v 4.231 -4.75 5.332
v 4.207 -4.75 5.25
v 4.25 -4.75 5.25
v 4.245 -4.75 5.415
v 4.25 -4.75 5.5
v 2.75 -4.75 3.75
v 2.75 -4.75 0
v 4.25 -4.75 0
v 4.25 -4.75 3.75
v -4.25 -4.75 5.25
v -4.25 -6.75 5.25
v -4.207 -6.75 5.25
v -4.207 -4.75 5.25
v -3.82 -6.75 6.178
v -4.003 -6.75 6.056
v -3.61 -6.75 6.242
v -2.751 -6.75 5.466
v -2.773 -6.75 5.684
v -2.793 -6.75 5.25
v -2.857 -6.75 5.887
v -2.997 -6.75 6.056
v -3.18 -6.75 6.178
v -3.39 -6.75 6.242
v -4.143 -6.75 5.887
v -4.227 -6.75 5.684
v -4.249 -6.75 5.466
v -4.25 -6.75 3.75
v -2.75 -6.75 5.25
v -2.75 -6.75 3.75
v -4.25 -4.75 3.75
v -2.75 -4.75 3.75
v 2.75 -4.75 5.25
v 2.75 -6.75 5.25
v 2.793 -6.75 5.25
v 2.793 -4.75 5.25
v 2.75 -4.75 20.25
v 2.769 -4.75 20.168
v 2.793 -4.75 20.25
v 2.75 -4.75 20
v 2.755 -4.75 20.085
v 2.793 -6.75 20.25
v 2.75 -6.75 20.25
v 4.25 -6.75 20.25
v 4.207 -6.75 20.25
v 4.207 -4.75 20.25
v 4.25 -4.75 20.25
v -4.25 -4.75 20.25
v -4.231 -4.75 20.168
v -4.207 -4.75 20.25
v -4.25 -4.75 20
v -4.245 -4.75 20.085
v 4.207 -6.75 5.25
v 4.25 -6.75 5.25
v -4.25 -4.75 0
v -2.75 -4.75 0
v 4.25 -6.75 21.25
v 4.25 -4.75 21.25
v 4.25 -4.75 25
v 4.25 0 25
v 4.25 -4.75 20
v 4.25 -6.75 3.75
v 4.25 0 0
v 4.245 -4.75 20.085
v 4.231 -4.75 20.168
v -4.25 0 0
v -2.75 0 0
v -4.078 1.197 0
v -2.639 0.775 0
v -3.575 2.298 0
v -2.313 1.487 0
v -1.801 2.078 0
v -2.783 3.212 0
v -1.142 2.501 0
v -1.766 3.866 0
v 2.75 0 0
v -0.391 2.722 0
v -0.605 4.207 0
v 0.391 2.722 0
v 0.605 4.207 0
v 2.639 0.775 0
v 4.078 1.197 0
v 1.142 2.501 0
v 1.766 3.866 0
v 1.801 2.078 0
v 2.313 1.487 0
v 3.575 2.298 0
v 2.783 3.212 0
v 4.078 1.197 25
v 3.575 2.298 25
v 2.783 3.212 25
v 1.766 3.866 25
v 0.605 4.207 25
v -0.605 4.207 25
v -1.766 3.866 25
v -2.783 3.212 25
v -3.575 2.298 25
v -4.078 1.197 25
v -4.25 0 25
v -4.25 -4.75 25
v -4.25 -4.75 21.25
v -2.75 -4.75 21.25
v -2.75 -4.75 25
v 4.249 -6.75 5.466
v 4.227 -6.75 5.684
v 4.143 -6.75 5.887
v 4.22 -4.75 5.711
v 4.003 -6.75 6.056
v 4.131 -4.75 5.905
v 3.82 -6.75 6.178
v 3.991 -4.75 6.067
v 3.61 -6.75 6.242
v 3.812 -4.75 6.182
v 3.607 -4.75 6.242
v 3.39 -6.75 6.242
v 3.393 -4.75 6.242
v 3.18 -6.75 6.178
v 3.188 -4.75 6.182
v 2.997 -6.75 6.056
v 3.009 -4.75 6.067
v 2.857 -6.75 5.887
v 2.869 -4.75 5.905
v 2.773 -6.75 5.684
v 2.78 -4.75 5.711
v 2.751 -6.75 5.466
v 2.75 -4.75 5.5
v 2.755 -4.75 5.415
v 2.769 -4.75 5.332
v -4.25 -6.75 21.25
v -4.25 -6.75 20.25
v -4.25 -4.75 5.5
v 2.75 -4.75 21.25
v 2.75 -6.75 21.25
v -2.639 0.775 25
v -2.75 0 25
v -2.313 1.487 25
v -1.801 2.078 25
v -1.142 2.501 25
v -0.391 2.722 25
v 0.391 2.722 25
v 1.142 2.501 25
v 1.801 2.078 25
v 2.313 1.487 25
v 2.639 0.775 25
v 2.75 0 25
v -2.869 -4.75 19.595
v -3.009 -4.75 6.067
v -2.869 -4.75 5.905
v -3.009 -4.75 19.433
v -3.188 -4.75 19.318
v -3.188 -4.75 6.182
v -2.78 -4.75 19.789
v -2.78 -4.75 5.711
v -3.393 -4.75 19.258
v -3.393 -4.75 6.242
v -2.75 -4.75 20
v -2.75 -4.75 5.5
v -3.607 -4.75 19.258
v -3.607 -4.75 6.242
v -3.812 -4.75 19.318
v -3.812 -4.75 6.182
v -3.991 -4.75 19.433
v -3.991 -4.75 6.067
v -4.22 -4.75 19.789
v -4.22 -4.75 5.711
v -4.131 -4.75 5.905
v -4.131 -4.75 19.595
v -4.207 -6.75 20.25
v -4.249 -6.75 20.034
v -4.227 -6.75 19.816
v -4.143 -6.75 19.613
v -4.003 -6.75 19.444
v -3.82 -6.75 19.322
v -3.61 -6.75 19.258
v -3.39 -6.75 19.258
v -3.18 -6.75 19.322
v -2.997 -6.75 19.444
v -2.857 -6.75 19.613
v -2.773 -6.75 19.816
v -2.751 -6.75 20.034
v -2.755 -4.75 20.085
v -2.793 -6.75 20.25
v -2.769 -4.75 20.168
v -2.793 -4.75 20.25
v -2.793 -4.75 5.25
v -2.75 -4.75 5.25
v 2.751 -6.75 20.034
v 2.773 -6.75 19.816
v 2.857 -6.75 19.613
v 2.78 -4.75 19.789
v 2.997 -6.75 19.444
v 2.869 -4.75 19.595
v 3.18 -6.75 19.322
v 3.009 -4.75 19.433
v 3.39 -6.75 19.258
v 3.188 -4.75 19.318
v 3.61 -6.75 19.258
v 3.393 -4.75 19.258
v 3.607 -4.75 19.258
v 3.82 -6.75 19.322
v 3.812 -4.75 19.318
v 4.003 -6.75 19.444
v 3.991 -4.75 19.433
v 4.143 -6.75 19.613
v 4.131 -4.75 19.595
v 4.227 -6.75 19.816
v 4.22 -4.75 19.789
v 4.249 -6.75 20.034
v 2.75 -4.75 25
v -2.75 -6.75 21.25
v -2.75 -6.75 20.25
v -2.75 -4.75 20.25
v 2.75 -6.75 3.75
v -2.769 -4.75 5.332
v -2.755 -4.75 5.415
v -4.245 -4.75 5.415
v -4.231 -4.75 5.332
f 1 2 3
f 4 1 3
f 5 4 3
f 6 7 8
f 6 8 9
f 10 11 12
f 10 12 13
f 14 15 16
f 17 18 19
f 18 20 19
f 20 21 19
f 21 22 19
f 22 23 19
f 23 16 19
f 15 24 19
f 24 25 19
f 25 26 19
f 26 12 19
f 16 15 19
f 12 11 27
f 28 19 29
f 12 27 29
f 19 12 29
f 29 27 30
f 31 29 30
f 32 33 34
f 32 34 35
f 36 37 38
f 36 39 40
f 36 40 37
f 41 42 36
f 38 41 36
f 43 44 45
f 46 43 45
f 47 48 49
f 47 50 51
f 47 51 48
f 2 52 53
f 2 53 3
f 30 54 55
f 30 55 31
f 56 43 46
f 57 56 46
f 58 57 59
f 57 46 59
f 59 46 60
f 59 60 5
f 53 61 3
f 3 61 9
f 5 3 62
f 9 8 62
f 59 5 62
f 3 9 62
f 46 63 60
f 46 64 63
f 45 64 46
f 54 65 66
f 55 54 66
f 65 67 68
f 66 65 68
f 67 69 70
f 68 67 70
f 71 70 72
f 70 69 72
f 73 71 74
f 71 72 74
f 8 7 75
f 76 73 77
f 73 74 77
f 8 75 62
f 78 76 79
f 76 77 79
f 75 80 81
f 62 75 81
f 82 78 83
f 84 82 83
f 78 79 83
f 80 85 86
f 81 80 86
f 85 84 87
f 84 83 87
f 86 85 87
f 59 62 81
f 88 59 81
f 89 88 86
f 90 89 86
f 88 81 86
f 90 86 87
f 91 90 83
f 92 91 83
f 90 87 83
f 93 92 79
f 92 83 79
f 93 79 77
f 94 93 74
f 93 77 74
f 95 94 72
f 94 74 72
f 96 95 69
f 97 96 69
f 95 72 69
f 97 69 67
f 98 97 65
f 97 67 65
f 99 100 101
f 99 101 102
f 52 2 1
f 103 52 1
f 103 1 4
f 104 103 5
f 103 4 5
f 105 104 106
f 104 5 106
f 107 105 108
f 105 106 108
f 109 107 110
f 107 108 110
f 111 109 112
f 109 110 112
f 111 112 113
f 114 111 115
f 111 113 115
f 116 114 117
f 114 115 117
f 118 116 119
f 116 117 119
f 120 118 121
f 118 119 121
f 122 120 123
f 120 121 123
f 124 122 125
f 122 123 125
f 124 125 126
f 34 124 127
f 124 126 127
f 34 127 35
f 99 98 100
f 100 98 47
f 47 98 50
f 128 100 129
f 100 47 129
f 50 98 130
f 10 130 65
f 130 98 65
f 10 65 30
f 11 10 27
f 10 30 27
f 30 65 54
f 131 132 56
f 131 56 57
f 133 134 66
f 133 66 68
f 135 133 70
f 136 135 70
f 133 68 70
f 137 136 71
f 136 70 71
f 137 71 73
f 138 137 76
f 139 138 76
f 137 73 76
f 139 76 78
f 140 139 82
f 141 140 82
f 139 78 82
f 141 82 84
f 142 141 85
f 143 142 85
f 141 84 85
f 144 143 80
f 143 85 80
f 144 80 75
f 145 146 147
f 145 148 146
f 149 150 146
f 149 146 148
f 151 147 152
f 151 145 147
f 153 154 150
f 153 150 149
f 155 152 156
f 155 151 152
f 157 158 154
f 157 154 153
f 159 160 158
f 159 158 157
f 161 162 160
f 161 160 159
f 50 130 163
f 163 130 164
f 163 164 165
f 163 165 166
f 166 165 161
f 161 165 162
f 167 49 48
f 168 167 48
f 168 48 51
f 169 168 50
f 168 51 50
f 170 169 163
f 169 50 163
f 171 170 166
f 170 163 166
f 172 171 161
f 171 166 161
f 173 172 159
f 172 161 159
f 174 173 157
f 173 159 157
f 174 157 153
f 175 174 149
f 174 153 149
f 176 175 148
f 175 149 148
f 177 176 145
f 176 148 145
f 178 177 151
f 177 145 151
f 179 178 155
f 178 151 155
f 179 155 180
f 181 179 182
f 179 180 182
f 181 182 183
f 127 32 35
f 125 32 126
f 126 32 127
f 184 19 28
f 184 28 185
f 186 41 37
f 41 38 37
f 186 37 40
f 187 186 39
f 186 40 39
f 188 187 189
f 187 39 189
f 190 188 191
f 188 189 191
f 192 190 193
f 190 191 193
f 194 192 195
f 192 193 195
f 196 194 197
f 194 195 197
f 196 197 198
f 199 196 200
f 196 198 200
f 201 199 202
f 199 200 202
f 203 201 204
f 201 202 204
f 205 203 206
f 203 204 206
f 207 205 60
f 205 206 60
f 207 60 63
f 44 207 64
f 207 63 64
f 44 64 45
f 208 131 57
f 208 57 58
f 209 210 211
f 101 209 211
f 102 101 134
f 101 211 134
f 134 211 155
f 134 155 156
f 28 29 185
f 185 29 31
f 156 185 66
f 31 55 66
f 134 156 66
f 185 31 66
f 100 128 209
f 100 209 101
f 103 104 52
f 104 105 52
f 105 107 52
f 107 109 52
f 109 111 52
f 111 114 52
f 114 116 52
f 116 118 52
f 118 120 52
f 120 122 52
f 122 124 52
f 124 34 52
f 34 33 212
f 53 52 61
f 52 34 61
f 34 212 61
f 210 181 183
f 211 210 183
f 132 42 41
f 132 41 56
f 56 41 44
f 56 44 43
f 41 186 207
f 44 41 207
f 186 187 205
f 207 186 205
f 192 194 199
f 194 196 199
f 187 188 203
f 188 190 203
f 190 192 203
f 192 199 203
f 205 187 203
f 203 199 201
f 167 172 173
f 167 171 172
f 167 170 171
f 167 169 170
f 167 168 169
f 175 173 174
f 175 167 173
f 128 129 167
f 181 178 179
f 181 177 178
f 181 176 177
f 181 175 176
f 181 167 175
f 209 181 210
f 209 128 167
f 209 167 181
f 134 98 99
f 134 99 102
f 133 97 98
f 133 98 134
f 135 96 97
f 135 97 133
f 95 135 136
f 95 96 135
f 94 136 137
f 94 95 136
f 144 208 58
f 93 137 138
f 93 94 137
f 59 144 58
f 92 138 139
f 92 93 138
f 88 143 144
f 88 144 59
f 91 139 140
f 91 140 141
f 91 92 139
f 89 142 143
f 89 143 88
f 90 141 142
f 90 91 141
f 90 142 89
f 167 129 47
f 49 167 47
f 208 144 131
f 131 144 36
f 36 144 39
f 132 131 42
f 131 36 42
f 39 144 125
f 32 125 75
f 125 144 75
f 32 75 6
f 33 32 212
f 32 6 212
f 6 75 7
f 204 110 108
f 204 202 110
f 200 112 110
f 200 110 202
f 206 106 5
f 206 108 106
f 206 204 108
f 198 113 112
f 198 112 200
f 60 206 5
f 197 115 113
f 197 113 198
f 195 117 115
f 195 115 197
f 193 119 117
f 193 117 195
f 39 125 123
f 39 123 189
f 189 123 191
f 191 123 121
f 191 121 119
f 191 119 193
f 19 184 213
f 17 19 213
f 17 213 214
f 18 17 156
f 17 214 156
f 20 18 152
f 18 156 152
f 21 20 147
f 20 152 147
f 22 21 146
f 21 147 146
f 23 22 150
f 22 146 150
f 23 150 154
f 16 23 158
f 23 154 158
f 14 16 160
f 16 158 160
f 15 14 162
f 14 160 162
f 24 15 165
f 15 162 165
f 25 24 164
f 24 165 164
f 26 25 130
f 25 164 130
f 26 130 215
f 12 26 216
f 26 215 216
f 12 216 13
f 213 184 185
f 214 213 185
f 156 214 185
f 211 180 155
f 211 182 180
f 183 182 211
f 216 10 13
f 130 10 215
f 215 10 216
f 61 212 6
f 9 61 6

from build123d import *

# Parameters (mm, degrees)
SM_BASE_FLANGE_1_DEPTH = 25
SKETCH_6_W             = 3.75
SKETCH_6_H             = 2
SKETCH_6_W_2           = 15
CUT_EXTRUDE_1_DEPTH    = 10
SKETCH_7_R             = 0.75
EXTRUDE_1_DEPTH        = 2


# Sheet-metal steps are written as plain solids
with BuildPart() as part:
    # Sketch 2 → 基体-法兰1 (new body)
    with BuildSketch(Plane.XY):
        with BuildLine():
            Line((4.25, -6.75), (4.25, 0))
            ThreePointArc((4.25, 0), (0, 4.25), (-4.25, 0))
            Line((-4.25, 0), (-4.25, -6.75))
            Line((-4.25, -6.75), (-2.75, -6.75))
            Line((-2.75, -6.75), (-2.75, 0))
            ThreePointArc((-2.75, 0), (0, 2.75), (2.75, 0))
            Line((2.75, 0), (2.75, -6.75))
            Line((2.75, -6.75), (4.25, -6.75))
        make_face()
    extrude(amount=SM_BASE_FLANGE_1_DEPTH)

    # 草图6 → 切除-拉伸1 (cut)
    with BuildSketch(Plane.ZY.offset(4.25)):
        with Locations((1.875, -5.75)):
            Rectangle(SKETCH_6_W, SKETCH_6_H)
        with Locations((12.75, -5.75)):
            Rectangle(SKETCH_6_W_2, SKETCH_6_H)
        with Locations((23.125, -5.75)):
            Rectangle(SKETCH_6_W, SKETCH_6_H)
    extrude(amount=-CUT_EXTRUDE_1_DEPTH, mode=Mode.SUBTRACT)

    # 草图7 → 凸台-拉伸1 (add)
    with BuildSketch(Plane.XZ.offset(4.75)):
        with Locations((-3.5, 20)):
            Circle(SKETCH_7_R)
        with Locations((-3.5, 5.5)):
            Circle(SKETCH_7_R)
        with Locations((3.5, 5.5)):
            Circle(SKETCH_7_R)
        with Locations((3.5, 20)):
            Circle(SKETCH_7_R)
    extrude(amount=EXTRUDE_1_DEPTH)


solid = part.part
